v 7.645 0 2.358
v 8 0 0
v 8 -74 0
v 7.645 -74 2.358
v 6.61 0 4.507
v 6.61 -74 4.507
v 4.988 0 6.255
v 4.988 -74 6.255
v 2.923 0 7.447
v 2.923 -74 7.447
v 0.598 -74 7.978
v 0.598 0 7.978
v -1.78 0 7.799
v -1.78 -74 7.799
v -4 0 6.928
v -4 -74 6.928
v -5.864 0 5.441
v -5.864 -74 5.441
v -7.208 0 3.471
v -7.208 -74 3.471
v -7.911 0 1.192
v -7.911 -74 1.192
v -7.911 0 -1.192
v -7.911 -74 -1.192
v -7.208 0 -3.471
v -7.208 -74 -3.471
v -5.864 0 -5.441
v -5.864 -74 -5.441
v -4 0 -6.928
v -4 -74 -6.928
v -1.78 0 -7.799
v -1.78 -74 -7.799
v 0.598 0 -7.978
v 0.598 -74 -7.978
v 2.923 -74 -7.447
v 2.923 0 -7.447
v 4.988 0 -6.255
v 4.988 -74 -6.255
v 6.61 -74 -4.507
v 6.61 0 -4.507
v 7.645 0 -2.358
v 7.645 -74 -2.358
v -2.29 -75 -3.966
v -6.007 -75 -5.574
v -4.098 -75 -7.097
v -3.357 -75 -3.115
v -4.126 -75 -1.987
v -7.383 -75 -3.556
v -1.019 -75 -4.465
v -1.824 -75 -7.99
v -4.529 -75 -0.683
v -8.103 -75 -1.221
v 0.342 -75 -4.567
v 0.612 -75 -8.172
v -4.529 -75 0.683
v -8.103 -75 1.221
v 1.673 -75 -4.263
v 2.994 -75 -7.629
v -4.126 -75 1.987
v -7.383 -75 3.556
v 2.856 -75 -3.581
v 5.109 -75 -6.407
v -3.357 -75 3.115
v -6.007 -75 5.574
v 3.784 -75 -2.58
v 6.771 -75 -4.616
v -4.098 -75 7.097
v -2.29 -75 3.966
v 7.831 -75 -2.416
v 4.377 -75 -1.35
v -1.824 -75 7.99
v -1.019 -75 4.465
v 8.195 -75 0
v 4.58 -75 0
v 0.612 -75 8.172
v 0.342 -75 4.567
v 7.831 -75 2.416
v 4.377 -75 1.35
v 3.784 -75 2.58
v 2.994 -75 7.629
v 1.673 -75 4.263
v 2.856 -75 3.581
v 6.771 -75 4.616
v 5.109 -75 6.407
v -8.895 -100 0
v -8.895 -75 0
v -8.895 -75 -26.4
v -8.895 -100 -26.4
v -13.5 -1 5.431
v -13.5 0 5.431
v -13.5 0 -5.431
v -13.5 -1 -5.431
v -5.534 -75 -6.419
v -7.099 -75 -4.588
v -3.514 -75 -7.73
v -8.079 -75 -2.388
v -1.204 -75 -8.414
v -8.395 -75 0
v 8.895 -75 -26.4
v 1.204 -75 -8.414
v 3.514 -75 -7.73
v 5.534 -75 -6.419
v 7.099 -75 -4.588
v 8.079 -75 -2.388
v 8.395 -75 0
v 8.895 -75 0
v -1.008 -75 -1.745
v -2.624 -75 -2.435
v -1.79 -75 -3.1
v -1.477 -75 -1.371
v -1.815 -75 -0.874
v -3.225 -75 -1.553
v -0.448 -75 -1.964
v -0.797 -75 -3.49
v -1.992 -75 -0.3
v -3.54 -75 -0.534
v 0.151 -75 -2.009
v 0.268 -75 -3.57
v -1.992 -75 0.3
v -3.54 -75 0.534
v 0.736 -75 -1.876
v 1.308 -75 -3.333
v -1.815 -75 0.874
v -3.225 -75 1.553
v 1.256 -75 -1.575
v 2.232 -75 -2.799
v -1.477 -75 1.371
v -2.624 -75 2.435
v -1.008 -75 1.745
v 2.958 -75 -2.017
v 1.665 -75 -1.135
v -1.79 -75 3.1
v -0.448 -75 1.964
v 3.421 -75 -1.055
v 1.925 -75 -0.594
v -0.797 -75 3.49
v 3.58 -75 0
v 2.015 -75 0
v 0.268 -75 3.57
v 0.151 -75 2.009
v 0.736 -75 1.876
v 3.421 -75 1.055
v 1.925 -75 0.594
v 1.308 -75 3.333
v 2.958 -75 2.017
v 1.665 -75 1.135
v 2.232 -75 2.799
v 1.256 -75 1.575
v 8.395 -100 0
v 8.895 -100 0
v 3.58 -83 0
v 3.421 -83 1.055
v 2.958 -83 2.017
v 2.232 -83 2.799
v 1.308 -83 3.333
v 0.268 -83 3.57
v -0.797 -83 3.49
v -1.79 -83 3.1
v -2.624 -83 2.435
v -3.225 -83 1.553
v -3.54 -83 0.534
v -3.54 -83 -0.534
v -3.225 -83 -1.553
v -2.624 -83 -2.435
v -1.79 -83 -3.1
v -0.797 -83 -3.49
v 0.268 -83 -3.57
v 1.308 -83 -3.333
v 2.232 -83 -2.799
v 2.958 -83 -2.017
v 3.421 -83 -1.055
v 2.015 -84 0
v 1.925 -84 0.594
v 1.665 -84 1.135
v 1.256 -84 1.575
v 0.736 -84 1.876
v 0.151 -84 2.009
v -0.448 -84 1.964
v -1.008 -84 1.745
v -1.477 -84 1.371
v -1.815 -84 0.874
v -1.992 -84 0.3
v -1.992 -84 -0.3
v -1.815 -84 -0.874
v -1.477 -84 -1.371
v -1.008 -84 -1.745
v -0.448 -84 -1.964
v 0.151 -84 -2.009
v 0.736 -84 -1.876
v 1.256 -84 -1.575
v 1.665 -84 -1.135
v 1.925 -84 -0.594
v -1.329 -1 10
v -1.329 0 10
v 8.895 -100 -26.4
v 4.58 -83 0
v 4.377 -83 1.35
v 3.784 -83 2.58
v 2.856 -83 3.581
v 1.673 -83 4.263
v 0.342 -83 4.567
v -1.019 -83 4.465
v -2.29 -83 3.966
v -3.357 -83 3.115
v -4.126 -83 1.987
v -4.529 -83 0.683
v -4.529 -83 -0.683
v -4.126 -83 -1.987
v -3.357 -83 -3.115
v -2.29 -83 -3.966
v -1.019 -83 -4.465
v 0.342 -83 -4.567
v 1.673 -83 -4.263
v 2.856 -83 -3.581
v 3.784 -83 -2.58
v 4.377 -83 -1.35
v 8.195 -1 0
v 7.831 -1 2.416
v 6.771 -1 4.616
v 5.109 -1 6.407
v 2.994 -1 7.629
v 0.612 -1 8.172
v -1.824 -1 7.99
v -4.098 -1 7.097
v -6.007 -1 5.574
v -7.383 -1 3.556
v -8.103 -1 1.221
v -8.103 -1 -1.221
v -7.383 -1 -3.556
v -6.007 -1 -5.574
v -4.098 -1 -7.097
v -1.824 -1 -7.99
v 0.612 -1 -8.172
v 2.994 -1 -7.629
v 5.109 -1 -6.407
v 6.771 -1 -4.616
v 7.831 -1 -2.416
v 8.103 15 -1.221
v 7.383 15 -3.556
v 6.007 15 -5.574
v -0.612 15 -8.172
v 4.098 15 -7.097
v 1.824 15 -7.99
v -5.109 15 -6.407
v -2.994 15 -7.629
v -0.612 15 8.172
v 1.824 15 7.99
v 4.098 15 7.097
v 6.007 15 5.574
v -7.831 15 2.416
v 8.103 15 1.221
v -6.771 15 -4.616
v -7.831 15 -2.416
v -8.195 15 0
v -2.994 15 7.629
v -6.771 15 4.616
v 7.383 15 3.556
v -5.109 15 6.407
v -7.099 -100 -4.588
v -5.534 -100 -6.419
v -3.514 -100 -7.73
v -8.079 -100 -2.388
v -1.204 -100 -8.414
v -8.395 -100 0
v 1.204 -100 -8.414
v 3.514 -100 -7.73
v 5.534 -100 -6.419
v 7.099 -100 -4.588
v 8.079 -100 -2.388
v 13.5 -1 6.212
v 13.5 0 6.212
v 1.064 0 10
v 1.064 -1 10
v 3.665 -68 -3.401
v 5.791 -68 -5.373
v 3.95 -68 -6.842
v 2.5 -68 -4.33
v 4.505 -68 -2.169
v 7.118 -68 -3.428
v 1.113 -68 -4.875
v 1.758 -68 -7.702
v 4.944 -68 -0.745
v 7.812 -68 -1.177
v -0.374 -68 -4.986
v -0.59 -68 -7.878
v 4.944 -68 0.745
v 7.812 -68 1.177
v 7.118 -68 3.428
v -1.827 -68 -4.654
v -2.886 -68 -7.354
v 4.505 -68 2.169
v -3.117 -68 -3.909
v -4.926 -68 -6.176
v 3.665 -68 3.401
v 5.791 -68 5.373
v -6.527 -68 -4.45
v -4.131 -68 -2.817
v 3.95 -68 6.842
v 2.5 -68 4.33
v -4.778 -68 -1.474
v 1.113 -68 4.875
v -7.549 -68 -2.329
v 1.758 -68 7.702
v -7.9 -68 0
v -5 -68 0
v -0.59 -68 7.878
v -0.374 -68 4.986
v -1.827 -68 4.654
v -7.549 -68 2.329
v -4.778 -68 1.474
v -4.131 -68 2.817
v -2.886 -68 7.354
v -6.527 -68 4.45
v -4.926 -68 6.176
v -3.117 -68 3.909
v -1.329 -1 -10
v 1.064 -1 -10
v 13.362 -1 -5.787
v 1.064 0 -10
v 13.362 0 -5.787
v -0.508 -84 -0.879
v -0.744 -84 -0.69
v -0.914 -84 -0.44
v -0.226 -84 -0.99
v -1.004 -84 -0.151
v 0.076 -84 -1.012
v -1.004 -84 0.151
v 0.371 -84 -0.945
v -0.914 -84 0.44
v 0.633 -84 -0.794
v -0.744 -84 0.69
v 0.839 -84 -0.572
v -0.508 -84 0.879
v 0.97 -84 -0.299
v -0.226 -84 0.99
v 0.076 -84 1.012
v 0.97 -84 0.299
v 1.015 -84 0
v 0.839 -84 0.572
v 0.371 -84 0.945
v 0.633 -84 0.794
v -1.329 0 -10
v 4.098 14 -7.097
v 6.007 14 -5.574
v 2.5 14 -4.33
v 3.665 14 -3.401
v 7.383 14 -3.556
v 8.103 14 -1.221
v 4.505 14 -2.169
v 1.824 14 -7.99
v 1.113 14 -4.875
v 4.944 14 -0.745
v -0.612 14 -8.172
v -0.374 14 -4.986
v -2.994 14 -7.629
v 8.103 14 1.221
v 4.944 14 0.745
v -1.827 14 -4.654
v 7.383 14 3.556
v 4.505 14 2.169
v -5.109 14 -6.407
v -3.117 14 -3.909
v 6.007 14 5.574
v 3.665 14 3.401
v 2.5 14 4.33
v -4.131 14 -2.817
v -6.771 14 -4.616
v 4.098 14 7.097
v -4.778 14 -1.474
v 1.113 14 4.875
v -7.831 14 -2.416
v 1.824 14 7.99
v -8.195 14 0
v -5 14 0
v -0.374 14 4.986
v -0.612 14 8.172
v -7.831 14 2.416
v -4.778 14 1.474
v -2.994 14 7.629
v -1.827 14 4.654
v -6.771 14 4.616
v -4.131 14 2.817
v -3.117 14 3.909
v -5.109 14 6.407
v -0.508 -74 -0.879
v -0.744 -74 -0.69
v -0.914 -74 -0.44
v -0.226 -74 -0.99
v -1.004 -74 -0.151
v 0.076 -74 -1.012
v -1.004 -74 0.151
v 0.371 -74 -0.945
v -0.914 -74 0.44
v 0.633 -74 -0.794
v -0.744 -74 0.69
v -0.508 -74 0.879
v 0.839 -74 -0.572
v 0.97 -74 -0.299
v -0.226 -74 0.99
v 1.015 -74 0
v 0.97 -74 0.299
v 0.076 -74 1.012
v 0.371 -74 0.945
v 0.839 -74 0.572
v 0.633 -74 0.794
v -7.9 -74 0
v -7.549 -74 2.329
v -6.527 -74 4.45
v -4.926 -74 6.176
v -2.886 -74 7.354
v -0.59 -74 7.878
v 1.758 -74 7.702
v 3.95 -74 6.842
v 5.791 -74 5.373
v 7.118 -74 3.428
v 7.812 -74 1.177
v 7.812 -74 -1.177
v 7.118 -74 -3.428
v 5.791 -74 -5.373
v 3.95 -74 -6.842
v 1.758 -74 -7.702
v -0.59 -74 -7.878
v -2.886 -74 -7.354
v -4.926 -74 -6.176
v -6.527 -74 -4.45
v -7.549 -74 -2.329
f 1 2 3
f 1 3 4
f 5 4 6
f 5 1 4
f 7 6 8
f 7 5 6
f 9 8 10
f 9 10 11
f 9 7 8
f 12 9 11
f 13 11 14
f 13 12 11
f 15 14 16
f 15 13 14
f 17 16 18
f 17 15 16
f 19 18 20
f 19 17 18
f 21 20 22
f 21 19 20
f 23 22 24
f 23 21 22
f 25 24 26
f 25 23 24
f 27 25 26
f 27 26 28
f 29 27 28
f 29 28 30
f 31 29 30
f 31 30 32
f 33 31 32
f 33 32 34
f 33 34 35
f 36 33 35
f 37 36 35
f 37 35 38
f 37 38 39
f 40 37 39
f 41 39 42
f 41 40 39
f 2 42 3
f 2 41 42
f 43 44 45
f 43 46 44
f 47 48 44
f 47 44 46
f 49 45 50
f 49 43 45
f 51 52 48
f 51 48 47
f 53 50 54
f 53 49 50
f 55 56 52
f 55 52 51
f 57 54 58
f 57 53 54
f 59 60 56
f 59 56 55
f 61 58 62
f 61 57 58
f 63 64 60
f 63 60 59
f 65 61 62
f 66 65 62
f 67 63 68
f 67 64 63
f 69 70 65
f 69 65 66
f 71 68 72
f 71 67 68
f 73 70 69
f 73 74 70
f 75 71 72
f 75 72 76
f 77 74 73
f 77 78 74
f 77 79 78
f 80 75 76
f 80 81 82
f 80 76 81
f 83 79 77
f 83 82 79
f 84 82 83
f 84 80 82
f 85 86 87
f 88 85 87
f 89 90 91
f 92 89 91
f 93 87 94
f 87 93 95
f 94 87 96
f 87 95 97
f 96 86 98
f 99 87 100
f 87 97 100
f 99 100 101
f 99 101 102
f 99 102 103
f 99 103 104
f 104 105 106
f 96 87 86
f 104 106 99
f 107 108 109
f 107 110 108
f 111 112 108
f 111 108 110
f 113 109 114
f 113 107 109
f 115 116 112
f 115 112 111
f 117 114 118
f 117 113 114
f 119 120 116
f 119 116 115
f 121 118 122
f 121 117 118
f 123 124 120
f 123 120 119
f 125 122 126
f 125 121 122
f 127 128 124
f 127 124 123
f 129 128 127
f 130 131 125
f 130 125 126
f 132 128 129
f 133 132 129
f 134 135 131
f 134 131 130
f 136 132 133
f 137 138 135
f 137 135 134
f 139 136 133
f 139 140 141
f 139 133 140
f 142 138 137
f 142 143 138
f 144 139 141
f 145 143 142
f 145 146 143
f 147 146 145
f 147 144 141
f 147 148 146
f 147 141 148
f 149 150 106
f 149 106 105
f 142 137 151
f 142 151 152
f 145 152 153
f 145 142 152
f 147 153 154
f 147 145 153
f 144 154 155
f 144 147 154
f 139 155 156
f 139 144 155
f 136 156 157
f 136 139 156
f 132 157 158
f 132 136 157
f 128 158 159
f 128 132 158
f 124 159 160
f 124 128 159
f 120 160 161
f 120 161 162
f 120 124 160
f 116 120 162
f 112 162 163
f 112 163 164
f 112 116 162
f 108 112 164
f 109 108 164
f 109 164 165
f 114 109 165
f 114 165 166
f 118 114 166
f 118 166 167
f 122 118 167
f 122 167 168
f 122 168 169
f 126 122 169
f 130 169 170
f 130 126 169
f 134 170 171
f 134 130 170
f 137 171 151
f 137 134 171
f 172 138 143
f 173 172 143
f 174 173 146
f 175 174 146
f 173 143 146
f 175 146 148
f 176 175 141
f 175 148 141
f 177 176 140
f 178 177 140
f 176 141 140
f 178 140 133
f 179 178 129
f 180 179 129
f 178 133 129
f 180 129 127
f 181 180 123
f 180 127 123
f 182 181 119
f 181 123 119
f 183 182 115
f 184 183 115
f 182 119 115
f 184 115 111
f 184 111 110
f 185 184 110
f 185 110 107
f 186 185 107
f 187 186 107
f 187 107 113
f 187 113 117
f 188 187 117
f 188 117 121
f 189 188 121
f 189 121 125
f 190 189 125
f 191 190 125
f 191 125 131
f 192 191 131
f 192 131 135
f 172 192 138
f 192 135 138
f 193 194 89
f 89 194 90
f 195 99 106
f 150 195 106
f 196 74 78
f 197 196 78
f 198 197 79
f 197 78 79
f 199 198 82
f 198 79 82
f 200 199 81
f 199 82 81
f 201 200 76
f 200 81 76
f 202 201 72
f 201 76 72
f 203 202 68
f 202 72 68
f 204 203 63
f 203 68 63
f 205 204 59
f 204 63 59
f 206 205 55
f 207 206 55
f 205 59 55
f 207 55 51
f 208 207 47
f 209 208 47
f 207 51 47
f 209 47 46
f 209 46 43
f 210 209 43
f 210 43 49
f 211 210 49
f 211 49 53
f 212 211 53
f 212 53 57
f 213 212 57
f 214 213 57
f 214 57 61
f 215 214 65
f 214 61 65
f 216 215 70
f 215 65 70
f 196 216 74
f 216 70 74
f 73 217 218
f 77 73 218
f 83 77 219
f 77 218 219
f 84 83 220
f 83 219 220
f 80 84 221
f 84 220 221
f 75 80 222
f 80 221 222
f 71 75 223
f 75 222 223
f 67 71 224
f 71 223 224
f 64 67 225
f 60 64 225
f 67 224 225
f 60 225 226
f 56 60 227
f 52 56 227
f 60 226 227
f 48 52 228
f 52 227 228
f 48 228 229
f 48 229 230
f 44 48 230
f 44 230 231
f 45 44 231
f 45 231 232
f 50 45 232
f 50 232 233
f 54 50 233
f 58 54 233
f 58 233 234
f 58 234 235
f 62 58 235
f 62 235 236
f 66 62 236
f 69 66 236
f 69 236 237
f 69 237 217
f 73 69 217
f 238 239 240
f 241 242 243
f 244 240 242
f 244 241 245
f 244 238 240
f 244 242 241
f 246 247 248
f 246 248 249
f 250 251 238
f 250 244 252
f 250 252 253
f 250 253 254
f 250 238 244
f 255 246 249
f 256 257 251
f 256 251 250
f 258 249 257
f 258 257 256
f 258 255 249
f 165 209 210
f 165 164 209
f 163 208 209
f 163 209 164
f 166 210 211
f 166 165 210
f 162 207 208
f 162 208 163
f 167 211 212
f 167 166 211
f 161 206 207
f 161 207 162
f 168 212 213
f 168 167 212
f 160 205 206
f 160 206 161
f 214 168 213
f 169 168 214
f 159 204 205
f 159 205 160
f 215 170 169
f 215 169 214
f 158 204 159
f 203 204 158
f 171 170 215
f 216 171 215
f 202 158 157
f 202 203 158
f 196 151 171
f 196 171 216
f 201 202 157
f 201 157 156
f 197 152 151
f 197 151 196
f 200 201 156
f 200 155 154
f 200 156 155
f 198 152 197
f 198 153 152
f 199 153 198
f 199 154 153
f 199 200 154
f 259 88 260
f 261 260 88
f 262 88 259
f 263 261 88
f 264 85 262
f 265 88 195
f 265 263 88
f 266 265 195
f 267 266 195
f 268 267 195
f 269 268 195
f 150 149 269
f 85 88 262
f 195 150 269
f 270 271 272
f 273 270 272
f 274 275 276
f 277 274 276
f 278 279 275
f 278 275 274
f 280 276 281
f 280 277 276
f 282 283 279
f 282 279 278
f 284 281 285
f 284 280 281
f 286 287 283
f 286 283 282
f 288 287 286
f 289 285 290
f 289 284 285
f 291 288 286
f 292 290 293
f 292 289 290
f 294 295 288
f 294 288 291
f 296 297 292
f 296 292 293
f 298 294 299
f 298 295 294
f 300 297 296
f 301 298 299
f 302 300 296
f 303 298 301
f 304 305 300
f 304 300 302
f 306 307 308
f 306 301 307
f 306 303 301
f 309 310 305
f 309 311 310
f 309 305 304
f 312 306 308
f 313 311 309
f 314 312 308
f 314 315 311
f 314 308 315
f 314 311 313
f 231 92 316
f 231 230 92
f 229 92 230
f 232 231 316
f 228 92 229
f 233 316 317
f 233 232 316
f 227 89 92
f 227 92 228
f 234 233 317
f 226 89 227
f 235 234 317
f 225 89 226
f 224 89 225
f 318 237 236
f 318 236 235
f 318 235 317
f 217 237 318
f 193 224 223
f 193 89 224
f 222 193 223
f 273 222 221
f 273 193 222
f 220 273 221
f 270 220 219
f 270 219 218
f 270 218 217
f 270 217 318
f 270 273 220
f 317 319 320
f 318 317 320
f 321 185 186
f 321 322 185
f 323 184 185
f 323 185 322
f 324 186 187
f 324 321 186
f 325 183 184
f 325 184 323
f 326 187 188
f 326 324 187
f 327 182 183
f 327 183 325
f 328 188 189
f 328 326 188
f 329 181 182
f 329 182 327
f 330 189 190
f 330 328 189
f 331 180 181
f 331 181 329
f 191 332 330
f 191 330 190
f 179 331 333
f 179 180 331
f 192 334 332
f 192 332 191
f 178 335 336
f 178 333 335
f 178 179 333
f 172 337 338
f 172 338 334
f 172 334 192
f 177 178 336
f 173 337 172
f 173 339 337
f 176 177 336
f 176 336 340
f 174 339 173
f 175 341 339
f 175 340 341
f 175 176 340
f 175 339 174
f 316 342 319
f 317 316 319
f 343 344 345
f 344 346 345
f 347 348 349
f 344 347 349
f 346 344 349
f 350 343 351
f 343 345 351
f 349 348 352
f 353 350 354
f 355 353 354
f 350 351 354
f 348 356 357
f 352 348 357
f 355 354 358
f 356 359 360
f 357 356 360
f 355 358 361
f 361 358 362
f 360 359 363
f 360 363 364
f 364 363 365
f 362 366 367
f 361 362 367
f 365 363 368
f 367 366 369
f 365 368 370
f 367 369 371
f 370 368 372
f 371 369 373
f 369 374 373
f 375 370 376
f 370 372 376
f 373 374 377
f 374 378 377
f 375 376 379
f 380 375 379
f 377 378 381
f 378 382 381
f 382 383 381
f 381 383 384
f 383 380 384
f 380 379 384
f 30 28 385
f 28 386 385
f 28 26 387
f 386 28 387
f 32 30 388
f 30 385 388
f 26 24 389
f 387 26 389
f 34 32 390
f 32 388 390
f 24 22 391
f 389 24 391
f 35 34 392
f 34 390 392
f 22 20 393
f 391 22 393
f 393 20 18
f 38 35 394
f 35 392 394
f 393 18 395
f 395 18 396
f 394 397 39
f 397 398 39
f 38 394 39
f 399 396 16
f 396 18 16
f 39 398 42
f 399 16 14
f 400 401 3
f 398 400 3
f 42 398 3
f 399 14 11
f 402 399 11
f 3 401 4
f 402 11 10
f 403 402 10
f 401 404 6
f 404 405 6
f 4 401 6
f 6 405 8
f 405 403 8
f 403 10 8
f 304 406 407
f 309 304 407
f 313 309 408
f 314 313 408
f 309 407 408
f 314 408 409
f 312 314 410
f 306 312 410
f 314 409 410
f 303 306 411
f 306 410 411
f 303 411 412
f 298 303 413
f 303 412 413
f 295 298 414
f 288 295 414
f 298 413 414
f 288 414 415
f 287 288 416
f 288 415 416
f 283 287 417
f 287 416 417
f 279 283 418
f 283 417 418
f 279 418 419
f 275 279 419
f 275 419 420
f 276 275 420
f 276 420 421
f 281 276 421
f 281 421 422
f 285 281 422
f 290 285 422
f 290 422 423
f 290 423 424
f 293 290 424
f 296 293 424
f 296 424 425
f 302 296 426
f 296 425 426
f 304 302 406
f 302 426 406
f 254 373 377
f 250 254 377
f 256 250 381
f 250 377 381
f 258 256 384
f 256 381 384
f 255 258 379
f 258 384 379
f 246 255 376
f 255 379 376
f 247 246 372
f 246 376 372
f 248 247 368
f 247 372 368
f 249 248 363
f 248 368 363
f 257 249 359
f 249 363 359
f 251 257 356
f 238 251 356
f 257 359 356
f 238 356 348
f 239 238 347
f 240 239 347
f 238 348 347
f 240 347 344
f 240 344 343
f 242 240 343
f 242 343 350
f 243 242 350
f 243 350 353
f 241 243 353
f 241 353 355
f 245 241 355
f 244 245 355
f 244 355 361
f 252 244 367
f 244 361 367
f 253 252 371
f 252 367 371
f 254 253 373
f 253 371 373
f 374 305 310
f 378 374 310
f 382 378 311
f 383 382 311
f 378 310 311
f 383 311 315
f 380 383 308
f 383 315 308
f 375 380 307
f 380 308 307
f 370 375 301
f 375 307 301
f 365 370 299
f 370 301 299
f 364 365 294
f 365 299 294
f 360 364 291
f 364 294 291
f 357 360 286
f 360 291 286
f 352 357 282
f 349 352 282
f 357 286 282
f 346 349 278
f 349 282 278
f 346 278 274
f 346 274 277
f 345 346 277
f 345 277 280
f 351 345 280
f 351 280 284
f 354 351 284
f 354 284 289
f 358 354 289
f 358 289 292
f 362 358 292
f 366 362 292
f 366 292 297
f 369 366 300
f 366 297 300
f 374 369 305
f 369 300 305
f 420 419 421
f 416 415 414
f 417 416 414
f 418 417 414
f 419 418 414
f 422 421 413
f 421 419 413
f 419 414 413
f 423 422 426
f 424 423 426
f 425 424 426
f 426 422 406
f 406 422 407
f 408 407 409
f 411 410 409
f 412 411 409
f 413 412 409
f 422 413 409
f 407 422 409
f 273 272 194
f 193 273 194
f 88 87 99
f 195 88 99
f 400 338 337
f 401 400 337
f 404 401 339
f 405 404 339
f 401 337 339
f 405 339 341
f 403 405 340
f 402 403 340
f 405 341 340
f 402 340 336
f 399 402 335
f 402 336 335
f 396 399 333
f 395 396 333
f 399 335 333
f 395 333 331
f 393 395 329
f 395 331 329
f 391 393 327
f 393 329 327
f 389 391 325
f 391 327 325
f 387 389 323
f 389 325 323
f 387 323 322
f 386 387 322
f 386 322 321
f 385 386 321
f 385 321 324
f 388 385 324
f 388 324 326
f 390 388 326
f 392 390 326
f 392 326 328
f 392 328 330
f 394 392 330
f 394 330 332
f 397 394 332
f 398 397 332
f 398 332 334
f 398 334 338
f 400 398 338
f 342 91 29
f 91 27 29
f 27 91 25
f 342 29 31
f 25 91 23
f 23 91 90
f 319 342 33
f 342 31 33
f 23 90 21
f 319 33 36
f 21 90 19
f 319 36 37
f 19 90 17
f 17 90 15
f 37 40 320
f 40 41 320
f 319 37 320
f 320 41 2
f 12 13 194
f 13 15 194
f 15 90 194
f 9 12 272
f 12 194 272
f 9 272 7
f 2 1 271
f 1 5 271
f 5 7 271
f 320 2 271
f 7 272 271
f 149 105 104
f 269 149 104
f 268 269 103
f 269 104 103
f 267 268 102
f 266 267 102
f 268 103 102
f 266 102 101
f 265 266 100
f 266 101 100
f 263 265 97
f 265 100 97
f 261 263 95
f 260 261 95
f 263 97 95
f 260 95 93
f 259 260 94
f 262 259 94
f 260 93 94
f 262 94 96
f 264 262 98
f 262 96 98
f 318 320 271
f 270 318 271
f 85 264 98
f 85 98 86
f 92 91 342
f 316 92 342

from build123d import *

# Parameters (mm, degrees)
F0_R      = 8.195
F1_DEPTH  = 75
F2_R      = 7.5
F3_DEPTH  = 1
F4_R      = 8
F5_DEPTH  = 74
F6_R      = 4.58
F6_R_2    = 3.58
F7_DEPTH  = 8
F8_R      = 2.015
F9_DEPTH  = 9
F10_R     = 1.015
F11_DEPTH = 75
F12_R     = 7.9
F13_DEPTH = 6
F14_R     = 5
F15_DEPTH = 82
F16_R     = 8.195
F17_DEPTH = 1
F19_DEPTH = 25


with BuildPart() as f1:
    # F0 (on Front) → F1 (new body)
    with BuildSketch(Plane.XZ):
        Circle(F0_R)
    extrude(amount=F1_DEPTH)

    # F2 (on Front) → F3 (join)
    with BuildSketch(Plane.XZ):
        Polygon((-1.3292512043, 10), (-13.5, 5.4313159715), (-13.5, -5.4313159715), (-1.3292512043, -10), (1.0640330359, -10), (13.3624045773, -5.7869182979), (13.5, 6.2122928219), (1.0640330359, 10), align=None)
        Circle(F2_R, mode=Mode.SUBTRACT)
    extrude(amount=F3_DEPTH)

    # F4 (on Front) → F5 (cut)
    with BuildSketch(Plane.XZ):
        Circle(F4_R)
    extrude(amount=F5_DEPTH, mode=Mode.SUBTRACT)

    # F6 (on face) → F7 (join)
    with BuildSketch(Plane.XZ.offset(75)):
        Circle(F6_R)
        Circle(F6_R_2, mode=Mode.SUBTRACT)
    extrude(amount=F7_DEPTH)

    # F8 (on face) → F9 (join)
    with BuildSketch(Plane.XZ.offset(75)):
        Circle(F8_R)
    extrude(amount=F9_DEPTH)

    # F10 (on face) → F11 (cut)
    with BuildSketch(Plane.XZ.offset(84)):
        Circle(F10_R)
    extrude(amount=-F11_DEPTH, mode=Mode.SUBTRACT)


with BuildPart() as f13:
    # F12 (on face) → F13 (new body)
    with BuildSketch(Plane(origin=(0, -74, 0), x_dir=(-1, 0, 0), z_dir=(0, 1, 0))):
        Circle(F12_R)
    extrude(amount=F13_DEPTH)

    # F14 (on face) → F15 (join)
    with BuildSketch(Plane(origin=(0, -68, 0), x_dir=(-1, 0, 0), z_dir=(0, 1, 0))):
        Circle(F14_R)
    extrude(amount=F15_DEPTH)

    # F16 (on face) → F17 (join)
    with BuildSketch(Plane(origin=(0, 14, 0), x_dir=(-1, 0, 0), z_dir=(0, 1, 0))):
        Circle(F16_R)
    extrude(amount=F17_DEPTH)


with BuildPart() as f19:
    # F18 (on face) → F19 (new body)
    with BuildSketch(Plane.XZ.offset(75)):
        with BuildLine():
            ThreePointArc((8.395, 0), (0, -8.5005856218), (-8.395, 0))
            Line((-8.395, 0), (-8.895, 0))
            Line((-8.895, 0), (-8.895, -26.4))
            Line((-8.895, -26.4), (8.895, -26.4))
            Line((8.895, -26.4), (8.895, 0))
            Line((8.895, 0), (8.395, 0))
        make_face()
    extrude(amount=F19_DEPTH)


solid = Compound([f1.part, f13.part, f19.part])
